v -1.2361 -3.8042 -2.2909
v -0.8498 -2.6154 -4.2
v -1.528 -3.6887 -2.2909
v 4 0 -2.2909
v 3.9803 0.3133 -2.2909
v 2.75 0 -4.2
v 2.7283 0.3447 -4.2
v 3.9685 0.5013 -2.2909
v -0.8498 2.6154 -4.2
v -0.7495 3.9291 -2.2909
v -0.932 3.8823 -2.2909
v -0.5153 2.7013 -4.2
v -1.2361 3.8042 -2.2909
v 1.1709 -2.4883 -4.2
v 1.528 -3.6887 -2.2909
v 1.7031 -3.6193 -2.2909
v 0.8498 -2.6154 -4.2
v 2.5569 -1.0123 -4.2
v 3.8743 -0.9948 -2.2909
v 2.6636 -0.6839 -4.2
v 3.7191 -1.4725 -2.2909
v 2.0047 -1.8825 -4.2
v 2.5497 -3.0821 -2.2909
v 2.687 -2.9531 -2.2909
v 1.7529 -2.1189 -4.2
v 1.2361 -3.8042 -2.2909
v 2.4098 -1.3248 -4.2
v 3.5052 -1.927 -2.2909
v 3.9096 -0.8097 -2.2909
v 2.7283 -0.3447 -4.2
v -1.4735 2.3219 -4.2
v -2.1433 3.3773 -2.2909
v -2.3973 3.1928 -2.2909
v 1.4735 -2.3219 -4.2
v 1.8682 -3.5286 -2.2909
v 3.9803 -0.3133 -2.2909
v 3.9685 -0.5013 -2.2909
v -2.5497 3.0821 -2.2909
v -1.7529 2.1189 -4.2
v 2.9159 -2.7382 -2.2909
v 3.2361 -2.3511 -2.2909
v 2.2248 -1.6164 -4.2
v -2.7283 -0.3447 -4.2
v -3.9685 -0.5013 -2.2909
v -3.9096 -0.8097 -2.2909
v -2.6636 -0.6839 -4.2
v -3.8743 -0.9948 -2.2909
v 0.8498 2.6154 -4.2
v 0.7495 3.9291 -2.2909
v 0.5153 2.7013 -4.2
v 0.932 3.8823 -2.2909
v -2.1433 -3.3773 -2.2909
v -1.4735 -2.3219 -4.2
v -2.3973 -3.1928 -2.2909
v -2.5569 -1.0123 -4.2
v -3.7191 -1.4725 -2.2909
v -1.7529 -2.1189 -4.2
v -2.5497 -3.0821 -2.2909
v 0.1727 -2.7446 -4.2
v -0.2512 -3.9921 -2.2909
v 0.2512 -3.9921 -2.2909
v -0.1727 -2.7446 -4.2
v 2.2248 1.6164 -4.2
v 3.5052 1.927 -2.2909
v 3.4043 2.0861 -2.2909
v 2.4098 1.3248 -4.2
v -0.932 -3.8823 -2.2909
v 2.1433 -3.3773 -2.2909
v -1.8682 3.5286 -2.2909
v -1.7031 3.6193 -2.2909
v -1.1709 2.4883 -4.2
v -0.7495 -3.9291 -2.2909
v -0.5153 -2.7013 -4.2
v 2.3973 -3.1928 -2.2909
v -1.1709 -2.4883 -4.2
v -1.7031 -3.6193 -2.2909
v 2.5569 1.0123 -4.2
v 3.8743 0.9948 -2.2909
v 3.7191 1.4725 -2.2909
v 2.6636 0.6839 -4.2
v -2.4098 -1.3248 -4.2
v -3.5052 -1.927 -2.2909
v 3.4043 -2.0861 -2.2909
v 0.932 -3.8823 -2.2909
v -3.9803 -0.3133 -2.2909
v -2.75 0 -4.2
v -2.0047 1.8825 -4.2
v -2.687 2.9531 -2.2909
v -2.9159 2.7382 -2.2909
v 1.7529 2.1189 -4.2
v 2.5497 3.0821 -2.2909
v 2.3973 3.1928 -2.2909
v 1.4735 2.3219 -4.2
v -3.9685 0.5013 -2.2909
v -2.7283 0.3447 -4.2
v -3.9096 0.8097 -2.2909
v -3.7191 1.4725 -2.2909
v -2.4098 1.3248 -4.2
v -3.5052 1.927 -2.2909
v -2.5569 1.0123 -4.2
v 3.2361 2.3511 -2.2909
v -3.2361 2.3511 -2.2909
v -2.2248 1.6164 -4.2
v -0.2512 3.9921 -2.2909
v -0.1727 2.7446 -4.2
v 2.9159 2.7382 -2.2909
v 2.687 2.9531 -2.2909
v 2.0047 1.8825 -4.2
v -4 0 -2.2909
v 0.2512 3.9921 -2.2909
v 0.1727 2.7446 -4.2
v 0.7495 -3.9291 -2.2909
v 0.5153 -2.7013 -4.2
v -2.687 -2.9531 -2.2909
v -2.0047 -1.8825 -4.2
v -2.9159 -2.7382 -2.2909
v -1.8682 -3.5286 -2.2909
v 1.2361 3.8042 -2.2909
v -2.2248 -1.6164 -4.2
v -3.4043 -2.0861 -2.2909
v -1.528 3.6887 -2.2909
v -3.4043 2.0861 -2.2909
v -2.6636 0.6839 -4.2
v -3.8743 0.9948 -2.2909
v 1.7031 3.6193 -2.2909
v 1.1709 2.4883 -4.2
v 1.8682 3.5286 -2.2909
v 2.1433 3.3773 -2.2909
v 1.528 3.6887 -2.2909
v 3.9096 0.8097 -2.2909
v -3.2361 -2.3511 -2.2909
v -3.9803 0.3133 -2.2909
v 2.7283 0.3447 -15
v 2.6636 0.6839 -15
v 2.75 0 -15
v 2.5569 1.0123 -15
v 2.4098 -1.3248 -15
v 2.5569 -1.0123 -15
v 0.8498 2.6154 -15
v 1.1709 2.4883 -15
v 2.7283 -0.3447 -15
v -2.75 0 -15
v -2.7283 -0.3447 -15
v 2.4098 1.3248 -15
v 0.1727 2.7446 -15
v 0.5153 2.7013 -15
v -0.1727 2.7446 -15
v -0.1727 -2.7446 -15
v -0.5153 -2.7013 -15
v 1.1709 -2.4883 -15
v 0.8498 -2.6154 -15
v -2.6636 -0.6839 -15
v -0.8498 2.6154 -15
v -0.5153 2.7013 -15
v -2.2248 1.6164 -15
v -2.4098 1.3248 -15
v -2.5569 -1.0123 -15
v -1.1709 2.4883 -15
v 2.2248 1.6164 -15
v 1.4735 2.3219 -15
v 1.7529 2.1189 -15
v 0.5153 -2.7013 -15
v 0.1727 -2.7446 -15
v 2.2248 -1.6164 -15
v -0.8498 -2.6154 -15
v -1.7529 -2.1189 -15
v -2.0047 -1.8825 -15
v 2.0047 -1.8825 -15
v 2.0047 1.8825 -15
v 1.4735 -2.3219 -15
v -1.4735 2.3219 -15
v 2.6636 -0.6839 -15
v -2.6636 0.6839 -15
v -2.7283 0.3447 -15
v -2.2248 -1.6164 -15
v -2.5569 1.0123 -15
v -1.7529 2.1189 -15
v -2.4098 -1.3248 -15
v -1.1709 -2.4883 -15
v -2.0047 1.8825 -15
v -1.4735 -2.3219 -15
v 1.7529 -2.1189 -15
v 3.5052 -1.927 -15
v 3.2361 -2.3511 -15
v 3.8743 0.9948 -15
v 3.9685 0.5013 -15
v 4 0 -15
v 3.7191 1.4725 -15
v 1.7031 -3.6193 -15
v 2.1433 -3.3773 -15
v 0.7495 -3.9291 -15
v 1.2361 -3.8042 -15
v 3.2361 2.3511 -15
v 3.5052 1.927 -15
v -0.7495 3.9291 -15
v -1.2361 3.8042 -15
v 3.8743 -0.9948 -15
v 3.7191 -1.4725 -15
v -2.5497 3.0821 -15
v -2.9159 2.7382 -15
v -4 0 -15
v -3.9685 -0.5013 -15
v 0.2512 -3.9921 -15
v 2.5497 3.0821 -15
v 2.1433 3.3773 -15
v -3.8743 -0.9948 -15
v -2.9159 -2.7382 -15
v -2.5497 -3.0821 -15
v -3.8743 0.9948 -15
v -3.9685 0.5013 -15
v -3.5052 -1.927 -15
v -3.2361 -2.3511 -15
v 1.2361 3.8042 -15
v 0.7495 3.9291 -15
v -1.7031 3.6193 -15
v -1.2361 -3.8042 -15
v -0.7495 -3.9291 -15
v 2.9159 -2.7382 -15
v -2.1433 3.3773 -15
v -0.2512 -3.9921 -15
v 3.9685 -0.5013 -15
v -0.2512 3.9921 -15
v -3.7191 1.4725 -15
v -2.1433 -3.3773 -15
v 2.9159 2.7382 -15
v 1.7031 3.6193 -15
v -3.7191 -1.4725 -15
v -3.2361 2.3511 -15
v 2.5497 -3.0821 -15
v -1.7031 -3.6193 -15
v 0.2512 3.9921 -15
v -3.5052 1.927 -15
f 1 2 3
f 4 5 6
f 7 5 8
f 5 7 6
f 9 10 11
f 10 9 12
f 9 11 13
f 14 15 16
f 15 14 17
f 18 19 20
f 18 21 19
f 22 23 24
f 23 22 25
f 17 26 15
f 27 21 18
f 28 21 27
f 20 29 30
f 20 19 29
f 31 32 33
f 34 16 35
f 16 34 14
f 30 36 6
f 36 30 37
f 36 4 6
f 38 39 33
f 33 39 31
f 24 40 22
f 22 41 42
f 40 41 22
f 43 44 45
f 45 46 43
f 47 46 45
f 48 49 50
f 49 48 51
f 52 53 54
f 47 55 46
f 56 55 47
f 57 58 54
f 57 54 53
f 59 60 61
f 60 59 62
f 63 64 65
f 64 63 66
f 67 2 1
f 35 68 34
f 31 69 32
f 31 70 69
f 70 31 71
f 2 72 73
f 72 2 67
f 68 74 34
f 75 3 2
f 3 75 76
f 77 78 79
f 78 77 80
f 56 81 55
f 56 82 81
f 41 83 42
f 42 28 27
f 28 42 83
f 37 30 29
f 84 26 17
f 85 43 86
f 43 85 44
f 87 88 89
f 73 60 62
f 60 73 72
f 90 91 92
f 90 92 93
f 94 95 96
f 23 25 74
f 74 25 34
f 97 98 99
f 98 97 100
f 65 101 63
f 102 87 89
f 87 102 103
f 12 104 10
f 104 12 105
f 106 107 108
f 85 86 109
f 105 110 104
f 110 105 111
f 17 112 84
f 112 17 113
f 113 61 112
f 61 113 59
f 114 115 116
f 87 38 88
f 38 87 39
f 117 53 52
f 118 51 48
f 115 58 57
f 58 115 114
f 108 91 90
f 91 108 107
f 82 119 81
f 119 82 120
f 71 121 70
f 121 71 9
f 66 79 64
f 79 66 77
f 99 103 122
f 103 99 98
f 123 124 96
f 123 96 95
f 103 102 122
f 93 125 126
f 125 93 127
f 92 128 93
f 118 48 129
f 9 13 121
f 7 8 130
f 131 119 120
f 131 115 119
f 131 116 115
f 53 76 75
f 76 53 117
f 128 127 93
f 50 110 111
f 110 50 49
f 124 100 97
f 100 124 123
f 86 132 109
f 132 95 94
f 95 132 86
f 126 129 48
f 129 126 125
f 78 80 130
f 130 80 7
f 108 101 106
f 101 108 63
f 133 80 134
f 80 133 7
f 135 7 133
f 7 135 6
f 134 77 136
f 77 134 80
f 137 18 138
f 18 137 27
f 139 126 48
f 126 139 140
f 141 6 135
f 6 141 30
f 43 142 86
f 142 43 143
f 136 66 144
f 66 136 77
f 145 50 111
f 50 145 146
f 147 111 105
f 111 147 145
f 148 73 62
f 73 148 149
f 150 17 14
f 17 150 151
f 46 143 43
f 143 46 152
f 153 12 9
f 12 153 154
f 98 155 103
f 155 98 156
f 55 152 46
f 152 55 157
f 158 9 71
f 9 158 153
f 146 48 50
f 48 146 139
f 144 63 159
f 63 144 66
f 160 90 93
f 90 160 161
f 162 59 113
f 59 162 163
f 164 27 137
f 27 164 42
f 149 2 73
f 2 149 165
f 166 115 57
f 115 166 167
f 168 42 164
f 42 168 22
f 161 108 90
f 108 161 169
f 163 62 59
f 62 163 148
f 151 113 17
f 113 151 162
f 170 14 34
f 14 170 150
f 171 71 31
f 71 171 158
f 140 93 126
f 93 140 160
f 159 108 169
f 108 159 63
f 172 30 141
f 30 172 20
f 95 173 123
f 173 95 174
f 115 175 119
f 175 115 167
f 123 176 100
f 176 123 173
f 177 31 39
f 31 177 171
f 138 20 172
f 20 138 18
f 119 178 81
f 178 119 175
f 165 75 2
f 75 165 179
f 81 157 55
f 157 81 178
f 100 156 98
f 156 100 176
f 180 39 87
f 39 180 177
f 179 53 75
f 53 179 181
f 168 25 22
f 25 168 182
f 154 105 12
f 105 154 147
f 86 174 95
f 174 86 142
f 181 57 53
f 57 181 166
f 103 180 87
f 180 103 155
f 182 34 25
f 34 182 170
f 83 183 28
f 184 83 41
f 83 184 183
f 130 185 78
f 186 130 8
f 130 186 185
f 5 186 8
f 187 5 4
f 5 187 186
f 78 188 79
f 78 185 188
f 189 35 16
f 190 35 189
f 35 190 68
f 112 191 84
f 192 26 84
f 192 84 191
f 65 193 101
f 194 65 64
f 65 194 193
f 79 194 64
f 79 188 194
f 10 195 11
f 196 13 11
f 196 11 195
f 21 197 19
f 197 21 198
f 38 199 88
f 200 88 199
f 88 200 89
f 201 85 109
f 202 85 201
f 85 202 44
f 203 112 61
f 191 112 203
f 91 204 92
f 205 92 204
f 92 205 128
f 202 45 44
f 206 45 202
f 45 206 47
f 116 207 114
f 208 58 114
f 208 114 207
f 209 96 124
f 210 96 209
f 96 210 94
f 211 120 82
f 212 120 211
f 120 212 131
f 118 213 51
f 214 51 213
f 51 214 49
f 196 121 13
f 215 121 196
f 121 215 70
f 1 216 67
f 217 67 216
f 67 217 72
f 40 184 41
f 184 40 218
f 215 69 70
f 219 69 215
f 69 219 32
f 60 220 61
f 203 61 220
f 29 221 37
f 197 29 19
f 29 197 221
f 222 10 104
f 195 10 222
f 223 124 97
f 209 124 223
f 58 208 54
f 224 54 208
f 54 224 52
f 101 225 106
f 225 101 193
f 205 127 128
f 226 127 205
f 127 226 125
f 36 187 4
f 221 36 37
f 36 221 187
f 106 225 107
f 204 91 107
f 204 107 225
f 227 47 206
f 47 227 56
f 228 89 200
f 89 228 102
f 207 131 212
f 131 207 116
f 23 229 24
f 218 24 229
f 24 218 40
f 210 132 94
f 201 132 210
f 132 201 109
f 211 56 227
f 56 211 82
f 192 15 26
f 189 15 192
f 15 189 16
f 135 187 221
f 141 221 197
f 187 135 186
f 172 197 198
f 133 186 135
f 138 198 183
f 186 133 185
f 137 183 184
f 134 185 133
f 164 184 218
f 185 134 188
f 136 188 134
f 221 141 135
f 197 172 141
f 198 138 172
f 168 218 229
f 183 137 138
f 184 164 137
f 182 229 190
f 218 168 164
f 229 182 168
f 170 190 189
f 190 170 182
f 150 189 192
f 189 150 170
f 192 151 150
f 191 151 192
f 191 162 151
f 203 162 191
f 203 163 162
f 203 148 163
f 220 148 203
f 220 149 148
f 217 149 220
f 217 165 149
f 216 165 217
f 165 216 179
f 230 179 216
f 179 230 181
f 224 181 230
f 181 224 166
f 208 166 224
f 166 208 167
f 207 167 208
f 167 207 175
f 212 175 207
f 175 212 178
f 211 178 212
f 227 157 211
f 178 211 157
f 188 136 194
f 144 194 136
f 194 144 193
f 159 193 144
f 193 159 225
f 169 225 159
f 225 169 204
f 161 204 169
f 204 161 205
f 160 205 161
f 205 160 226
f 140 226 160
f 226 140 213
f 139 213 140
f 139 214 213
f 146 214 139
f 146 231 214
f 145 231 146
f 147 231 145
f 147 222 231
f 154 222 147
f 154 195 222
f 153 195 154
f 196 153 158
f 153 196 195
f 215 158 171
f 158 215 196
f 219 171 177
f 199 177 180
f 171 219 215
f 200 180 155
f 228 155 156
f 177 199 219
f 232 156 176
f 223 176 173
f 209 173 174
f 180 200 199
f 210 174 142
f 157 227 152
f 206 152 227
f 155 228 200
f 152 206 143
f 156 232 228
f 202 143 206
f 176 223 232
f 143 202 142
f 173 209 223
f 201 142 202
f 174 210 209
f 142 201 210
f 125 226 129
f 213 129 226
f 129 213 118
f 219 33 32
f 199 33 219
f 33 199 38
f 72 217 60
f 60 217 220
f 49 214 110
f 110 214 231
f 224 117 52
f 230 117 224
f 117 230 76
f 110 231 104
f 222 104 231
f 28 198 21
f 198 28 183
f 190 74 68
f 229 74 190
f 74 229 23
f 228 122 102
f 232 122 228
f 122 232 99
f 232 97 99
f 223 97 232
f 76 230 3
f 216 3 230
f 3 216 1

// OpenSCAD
$fn = 50;

difference() {
	union() {
		translate(v = [0, 0, -15.0]) {
			cylinder(h = 15, r = 4.0);
		}
	}
	union() {
		translate(v = [0, 0, 0]) {
			rotate(a = [0, 0, 0]) {
				difference() {
					union() {
						translate(v = [0, 0, -18.0]) {
							cylinder(h = 18, r = 2.25);
						}
						translate(v = [0, 0, -4.2]) {
							cylinder(h = 4.2, r1 = 2.75, r2 = 5.5);
						}
						translate(v = [0, 0, -18.0]) {
							cylinder(h = 18, r = 2.75);
						}
						translate(v = [0, 0, -18.0]) {
							cylinder(h = 18, r = 2.25);
						}
					}
					union();
				}
			}
		}
	}
}
